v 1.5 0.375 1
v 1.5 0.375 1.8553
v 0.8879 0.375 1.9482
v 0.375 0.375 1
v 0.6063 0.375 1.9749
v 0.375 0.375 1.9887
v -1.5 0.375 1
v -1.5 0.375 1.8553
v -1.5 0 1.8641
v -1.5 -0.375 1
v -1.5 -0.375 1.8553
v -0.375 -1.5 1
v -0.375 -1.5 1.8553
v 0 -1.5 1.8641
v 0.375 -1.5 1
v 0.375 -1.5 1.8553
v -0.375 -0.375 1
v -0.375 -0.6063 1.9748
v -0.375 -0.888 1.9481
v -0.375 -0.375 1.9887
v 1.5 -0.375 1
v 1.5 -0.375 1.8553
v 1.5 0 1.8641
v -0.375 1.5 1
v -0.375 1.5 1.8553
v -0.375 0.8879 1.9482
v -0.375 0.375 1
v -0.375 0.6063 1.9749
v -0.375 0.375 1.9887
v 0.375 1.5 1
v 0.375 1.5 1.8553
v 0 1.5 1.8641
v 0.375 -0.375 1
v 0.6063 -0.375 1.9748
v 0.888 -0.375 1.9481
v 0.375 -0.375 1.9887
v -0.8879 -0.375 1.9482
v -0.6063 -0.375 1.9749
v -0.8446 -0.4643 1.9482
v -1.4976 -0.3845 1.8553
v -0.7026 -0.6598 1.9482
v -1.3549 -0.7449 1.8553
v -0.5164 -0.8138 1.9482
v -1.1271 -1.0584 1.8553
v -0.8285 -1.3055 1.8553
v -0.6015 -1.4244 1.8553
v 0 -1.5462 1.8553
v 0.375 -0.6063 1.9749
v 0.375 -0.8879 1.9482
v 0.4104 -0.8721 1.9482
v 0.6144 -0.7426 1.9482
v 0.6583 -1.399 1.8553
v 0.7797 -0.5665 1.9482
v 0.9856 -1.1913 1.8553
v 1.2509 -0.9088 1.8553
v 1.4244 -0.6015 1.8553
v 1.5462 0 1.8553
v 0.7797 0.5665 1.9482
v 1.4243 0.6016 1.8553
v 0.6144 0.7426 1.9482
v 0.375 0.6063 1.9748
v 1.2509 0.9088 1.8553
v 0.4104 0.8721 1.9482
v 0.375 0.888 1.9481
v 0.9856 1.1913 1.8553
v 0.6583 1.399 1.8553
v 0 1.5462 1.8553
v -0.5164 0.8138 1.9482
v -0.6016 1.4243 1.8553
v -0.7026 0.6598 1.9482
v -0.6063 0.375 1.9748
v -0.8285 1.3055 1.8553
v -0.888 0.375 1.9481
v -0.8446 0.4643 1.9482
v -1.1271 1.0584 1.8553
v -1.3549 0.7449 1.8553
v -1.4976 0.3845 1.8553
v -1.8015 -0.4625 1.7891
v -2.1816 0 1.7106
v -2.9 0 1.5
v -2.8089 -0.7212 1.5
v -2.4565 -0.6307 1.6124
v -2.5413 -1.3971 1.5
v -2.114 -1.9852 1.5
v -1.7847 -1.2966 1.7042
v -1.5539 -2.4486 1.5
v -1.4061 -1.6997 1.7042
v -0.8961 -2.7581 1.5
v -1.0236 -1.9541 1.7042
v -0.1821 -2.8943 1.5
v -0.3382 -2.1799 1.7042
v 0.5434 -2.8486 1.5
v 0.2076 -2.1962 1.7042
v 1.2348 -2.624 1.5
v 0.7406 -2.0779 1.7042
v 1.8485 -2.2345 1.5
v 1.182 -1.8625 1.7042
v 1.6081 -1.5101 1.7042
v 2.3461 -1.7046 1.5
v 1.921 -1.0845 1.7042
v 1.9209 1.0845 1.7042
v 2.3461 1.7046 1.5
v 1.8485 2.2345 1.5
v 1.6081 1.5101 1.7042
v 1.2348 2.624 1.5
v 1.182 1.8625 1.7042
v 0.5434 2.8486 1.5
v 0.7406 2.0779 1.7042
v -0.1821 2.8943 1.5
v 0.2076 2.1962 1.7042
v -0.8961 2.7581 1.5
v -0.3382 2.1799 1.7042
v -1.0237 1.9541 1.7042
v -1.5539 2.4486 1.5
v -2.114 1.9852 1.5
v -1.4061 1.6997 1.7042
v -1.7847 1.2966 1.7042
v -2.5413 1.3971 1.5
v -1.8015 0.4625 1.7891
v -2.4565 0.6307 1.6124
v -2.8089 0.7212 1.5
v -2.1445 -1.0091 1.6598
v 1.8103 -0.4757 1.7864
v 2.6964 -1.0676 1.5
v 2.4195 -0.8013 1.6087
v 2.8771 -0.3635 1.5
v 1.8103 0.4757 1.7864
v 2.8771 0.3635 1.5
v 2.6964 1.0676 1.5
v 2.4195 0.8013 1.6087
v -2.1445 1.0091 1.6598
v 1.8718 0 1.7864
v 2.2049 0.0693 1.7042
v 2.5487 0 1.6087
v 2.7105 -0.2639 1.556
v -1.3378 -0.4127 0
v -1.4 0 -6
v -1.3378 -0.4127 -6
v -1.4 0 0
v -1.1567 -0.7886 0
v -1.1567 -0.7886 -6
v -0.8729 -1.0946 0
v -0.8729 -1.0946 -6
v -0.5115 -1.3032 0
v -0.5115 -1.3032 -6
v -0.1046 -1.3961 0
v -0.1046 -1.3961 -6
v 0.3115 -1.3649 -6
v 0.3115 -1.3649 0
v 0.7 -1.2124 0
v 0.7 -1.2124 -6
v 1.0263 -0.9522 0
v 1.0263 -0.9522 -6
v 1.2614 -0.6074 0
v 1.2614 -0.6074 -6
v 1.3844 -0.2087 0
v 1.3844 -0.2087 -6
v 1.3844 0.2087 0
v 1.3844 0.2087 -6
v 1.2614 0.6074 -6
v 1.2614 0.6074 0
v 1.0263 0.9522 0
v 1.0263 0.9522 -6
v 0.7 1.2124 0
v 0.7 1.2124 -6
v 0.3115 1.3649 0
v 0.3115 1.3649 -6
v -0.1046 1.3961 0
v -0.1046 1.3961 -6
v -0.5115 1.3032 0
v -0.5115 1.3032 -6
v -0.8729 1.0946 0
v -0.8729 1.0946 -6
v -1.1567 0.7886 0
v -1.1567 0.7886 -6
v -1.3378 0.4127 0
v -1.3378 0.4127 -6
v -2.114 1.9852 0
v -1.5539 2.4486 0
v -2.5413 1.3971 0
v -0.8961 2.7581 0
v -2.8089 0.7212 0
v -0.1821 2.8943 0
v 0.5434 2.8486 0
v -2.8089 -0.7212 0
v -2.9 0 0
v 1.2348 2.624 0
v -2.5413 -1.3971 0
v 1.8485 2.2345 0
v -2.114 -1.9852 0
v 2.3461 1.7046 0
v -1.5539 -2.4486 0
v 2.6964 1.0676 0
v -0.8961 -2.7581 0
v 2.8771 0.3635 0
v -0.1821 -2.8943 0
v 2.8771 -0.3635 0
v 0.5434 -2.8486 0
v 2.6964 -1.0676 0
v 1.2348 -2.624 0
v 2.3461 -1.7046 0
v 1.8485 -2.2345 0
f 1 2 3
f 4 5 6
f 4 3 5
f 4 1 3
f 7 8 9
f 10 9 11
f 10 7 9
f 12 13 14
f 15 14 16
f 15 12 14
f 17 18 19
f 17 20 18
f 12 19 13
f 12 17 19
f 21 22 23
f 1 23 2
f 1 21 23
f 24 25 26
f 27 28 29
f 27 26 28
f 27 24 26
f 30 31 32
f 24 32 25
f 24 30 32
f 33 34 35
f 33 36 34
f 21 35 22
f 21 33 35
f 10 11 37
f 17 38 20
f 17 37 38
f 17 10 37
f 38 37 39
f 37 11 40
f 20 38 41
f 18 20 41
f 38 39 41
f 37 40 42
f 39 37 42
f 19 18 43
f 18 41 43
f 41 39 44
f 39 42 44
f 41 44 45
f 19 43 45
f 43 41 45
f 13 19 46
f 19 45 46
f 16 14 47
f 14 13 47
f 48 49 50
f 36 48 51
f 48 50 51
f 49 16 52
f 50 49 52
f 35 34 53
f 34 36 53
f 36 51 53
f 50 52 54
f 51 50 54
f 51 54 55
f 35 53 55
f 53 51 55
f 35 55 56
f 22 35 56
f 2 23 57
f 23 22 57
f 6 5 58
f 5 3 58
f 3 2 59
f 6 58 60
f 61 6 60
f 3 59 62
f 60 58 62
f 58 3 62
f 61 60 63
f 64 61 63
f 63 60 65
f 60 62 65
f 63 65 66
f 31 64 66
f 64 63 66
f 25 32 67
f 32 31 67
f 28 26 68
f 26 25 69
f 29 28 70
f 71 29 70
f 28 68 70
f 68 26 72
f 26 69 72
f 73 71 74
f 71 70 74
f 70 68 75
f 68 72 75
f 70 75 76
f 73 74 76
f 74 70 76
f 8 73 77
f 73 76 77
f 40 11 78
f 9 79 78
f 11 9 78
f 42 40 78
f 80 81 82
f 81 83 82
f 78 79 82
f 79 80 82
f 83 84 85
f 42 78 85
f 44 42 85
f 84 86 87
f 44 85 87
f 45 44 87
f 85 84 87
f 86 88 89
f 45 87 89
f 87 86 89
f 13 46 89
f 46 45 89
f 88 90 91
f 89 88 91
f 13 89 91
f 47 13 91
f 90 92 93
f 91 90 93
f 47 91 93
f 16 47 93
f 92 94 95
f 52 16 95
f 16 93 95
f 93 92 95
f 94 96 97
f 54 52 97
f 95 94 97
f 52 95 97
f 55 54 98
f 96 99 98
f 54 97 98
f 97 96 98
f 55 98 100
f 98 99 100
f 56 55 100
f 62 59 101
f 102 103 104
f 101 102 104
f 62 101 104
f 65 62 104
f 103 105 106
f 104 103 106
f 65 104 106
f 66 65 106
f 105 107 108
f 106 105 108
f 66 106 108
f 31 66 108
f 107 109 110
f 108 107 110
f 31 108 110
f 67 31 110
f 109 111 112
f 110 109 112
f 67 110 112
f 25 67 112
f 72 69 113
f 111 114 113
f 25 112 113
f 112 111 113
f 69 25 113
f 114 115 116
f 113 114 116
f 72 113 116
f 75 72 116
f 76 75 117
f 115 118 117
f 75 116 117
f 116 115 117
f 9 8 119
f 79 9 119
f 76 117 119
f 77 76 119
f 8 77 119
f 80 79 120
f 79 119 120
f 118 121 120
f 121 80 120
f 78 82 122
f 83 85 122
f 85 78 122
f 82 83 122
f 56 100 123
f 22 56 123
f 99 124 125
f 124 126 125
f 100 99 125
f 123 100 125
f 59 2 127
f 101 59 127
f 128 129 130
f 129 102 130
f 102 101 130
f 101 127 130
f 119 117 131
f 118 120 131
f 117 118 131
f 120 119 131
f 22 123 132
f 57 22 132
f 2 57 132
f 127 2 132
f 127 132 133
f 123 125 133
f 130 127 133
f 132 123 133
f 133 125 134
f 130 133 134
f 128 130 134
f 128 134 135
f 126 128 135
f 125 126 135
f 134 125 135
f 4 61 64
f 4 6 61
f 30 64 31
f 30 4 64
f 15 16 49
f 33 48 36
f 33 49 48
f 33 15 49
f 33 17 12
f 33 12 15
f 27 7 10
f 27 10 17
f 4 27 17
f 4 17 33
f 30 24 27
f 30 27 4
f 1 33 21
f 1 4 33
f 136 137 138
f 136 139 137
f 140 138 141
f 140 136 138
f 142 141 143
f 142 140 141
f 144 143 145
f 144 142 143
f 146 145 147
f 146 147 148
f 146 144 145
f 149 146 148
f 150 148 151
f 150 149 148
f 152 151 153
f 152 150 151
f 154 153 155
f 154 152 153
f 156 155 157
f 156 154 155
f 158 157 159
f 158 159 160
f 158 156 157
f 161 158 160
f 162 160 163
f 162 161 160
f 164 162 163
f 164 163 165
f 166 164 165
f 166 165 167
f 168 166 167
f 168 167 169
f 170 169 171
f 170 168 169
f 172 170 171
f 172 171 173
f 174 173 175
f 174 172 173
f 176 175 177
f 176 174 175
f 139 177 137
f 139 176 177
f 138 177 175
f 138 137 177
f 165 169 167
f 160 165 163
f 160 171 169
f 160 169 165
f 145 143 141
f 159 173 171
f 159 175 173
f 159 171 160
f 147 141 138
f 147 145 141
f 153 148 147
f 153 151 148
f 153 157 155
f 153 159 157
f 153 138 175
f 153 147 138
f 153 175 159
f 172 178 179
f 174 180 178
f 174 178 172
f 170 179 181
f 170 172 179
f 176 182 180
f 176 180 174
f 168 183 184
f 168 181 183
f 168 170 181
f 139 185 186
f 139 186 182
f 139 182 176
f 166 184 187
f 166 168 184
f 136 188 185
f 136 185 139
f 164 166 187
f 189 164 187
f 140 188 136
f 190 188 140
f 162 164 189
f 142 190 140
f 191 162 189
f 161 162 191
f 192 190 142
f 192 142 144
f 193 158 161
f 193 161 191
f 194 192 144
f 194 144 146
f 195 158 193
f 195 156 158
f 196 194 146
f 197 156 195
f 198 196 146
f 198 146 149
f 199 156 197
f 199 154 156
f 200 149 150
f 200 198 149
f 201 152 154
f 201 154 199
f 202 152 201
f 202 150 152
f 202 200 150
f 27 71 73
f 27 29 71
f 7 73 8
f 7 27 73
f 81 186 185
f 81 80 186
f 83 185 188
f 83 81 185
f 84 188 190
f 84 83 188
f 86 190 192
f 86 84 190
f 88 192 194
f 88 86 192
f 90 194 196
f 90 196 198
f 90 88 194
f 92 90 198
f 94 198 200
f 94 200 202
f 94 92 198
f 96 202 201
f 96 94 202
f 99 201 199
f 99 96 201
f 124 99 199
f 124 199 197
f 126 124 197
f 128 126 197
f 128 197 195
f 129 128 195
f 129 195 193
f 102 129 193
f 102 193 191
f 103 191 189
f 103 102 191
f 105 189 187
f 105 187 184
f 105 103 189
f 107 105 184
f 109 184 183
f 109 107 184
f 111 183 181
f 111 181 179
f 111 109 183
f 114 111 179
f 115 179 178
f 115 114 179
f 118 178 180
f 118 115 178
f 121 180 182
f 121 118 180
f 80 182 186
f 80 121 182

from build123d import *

# Parameters (mm, degrees)
POCKET_DEPTH = 1.002493


with BuildPart() as part:
    # Sketch → Revolution (revolve)
    with BuildSketch(Plane.XZ):
        with BuildLine():
            Line((0, -6), (-1.4, -6))
            Line((-1.4, -6), (-1.4, 0))
            Line((-1.4, 0), (-2.9, 0))
            Line((-2.9, 0), (-2.9, 1.5))
            add(Edge.make_bspline(
                [(0, 2), (-1.27, 2.028858), (-2.9, 1.5)],
                knots=[0, 0, 0, 1, 1, 1], degree=2))
            Line((0, 2), (0, -6))
        make_face()
    revolve(axis=Axis((0, 0, 0), (0, 0, 1)))

    # Sketch001 → Pocket (cut, through all)
    with BuildSketch(Plane.XY.offset(1)):
        Polygon((0.375, 1.5), (-0.375, 1.5), (-0.375, 0.375), (-1.5, 0.375), (-1.5, -0.375), (-0.375, -0.375), (-0.375, -1.5), (0.375, -1.5), (0.375, -0.375), (1.5, -0.375), (1.5, 0.375), (0.375, 0.375), align=None)
    extrude(amount=POCKET_DEPTH, mode=Mode.SUBTRACT)


solid = part.part
